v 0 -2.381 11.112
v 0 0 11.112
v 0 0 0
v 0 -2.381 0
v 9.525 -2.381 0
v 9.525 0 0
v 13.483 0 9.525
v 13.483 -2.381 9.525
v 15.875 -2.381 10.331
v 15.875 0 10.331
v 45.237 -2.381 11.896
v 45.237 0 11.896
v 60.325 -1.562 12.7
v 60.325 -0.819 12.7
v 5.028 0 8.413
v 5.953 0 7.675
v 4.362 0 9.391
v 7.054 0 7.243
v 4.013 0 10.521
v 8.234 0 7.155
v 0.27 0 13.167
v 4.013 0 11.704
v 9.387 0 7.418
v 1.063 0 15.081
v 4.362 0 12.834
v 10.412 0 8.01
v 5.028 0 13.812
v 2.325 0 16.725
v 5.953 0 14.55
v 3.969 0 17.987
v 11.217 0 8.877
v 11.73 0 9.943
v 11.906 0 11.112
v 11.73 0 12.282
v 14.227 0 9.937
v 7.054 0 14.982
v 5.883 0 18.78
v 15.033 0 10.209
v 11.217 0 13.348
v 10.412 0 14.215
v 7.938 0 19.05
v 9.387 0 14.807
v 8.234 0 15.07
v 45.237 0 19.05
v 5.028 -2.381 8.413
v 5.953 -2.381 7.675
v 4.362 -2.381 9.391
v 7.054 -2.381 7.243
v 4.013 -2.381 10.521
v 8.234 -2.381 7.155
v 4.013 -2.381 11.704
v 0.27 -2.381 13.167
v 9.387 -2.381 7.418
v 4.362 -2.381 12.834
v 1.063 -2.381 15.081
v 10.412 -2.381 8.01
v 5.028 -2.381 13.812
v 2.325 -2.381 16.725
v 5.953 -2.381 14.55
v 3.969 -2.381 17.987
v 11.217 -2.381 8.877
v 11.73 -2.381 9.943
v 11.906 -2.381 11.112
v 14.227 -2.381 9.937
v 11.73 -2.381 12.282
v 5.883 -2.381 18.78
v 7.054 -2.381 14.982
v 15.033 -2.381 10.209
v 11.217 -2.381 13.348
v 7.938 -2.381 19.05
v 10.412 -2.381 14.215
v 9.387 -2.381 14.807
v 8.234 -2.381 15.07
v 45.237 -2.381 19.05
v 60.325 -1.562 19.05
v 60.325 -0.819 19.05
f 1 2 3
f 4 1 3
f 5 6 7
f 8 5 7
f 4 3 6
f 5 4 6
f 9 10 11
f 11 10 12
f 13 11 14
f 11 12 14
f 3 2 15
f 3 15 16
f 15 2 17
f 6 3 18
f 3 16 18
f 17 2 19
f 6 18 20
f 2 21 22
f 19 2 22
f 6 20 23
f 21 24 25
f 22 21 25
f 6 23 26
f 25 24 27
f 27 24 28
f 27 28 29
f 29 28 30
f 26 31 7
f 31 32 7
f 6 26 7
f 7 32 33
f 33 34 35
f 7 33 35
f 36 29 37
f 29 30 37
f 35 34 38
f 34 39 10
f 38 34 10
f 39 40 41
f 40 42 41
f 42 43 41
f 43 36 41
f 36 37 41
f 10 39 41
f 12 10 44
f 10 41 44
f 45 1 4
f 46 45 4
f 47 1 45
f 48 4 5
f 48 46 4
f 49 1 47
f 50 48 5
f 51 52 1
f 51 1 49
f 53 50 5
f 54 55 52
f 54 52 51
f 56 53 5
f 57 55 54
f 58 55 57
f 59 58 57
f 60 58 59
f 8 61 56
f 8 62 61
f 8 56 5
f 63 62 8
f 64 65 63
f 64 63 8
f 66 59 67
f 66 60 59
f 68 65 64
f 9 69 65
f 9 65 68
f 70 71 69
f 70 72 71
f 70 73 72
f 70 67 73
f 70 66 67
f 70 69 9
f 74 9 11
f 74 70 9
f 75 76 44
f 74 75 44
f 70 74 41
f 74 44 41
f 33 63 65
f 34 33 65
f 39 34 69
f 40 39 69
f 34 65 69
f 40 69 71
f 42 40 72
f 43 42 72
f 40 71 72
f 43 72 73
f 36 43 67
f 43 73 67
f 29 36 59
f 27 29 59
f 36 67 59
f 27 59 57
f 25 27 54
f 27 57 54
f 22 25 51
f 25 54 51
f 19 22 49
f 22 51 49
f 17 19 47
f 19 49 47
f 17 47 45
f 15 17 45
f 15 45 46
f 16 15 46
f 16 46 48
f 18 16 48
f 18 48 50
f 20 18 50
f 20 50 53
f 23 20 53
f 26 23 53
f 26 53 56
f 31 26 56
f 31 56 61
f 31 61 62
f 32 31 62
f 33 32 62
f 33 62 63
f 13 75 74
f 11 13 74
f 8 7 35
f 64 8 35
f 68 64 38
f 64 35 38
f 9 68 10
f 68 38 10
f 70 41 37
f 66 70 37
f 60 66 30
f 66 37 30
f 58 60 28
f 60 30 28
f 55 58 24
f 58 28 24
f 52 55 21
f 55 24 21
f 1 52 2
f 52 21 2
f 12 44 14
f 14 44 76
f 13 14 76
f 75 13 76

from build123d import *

# Parameters (mm, degrees)
F1_DEPTH = 2.38125
F4_R     = 3.96875
F5_DEPTH = 25.4
F7_DEPTH = 25.4


with BuildPart() as f1:
    # F0 (on Front) → F1 (new body)
    with BuildSketch(Plane.XZ):
        with BuildLine():
            Line((60.325, 19.05), (7.9375, 19.05))
            ThreePointArc((7.9375, 19.05), (2.32484, 16.72516), (0, 11.1125))
            Line((0, 11.1125), (0, 0))
            Line((0, 0), (9.525, 0))
            Line((9.525, 0), (13.483182, 9.525))
            ThreePointArc((13.483182, 9.525), (14.624025, 10.091332), (15.875, 10.330743))
            Line((15.875, 10.330743), (60.325, 12.7))
            Line((60.325, 12.7), (60.325, 19.05))
        make_face()
    extrude(amount=F1_DEPTH)

    # F4 (on face) → F5 (cut)
    with BuildSketch(Plane.XZ.offset(2.38125)):
        with Locations((7.9375, 11.1125)):
            Circle(F4_R)
    extrude(amount=-F5_DEPTH, mode=Mode.SUBTRACT)

    # F6 (on face) → F7 (cut)
    with BuildSketch(Plane.XY.offset(19.05)):
        Polygon((60.325, 0), (45.2374, 0), (60.325, -0.819355), align=None)
        Polygon((60.325, -2.38125), (60.325, -1.561895), (45.2374, -2.38125), align=None)
    extrude(amount=-F7_DEPTH, mode=Mode.SUBTRACT)


solid = f1.part
